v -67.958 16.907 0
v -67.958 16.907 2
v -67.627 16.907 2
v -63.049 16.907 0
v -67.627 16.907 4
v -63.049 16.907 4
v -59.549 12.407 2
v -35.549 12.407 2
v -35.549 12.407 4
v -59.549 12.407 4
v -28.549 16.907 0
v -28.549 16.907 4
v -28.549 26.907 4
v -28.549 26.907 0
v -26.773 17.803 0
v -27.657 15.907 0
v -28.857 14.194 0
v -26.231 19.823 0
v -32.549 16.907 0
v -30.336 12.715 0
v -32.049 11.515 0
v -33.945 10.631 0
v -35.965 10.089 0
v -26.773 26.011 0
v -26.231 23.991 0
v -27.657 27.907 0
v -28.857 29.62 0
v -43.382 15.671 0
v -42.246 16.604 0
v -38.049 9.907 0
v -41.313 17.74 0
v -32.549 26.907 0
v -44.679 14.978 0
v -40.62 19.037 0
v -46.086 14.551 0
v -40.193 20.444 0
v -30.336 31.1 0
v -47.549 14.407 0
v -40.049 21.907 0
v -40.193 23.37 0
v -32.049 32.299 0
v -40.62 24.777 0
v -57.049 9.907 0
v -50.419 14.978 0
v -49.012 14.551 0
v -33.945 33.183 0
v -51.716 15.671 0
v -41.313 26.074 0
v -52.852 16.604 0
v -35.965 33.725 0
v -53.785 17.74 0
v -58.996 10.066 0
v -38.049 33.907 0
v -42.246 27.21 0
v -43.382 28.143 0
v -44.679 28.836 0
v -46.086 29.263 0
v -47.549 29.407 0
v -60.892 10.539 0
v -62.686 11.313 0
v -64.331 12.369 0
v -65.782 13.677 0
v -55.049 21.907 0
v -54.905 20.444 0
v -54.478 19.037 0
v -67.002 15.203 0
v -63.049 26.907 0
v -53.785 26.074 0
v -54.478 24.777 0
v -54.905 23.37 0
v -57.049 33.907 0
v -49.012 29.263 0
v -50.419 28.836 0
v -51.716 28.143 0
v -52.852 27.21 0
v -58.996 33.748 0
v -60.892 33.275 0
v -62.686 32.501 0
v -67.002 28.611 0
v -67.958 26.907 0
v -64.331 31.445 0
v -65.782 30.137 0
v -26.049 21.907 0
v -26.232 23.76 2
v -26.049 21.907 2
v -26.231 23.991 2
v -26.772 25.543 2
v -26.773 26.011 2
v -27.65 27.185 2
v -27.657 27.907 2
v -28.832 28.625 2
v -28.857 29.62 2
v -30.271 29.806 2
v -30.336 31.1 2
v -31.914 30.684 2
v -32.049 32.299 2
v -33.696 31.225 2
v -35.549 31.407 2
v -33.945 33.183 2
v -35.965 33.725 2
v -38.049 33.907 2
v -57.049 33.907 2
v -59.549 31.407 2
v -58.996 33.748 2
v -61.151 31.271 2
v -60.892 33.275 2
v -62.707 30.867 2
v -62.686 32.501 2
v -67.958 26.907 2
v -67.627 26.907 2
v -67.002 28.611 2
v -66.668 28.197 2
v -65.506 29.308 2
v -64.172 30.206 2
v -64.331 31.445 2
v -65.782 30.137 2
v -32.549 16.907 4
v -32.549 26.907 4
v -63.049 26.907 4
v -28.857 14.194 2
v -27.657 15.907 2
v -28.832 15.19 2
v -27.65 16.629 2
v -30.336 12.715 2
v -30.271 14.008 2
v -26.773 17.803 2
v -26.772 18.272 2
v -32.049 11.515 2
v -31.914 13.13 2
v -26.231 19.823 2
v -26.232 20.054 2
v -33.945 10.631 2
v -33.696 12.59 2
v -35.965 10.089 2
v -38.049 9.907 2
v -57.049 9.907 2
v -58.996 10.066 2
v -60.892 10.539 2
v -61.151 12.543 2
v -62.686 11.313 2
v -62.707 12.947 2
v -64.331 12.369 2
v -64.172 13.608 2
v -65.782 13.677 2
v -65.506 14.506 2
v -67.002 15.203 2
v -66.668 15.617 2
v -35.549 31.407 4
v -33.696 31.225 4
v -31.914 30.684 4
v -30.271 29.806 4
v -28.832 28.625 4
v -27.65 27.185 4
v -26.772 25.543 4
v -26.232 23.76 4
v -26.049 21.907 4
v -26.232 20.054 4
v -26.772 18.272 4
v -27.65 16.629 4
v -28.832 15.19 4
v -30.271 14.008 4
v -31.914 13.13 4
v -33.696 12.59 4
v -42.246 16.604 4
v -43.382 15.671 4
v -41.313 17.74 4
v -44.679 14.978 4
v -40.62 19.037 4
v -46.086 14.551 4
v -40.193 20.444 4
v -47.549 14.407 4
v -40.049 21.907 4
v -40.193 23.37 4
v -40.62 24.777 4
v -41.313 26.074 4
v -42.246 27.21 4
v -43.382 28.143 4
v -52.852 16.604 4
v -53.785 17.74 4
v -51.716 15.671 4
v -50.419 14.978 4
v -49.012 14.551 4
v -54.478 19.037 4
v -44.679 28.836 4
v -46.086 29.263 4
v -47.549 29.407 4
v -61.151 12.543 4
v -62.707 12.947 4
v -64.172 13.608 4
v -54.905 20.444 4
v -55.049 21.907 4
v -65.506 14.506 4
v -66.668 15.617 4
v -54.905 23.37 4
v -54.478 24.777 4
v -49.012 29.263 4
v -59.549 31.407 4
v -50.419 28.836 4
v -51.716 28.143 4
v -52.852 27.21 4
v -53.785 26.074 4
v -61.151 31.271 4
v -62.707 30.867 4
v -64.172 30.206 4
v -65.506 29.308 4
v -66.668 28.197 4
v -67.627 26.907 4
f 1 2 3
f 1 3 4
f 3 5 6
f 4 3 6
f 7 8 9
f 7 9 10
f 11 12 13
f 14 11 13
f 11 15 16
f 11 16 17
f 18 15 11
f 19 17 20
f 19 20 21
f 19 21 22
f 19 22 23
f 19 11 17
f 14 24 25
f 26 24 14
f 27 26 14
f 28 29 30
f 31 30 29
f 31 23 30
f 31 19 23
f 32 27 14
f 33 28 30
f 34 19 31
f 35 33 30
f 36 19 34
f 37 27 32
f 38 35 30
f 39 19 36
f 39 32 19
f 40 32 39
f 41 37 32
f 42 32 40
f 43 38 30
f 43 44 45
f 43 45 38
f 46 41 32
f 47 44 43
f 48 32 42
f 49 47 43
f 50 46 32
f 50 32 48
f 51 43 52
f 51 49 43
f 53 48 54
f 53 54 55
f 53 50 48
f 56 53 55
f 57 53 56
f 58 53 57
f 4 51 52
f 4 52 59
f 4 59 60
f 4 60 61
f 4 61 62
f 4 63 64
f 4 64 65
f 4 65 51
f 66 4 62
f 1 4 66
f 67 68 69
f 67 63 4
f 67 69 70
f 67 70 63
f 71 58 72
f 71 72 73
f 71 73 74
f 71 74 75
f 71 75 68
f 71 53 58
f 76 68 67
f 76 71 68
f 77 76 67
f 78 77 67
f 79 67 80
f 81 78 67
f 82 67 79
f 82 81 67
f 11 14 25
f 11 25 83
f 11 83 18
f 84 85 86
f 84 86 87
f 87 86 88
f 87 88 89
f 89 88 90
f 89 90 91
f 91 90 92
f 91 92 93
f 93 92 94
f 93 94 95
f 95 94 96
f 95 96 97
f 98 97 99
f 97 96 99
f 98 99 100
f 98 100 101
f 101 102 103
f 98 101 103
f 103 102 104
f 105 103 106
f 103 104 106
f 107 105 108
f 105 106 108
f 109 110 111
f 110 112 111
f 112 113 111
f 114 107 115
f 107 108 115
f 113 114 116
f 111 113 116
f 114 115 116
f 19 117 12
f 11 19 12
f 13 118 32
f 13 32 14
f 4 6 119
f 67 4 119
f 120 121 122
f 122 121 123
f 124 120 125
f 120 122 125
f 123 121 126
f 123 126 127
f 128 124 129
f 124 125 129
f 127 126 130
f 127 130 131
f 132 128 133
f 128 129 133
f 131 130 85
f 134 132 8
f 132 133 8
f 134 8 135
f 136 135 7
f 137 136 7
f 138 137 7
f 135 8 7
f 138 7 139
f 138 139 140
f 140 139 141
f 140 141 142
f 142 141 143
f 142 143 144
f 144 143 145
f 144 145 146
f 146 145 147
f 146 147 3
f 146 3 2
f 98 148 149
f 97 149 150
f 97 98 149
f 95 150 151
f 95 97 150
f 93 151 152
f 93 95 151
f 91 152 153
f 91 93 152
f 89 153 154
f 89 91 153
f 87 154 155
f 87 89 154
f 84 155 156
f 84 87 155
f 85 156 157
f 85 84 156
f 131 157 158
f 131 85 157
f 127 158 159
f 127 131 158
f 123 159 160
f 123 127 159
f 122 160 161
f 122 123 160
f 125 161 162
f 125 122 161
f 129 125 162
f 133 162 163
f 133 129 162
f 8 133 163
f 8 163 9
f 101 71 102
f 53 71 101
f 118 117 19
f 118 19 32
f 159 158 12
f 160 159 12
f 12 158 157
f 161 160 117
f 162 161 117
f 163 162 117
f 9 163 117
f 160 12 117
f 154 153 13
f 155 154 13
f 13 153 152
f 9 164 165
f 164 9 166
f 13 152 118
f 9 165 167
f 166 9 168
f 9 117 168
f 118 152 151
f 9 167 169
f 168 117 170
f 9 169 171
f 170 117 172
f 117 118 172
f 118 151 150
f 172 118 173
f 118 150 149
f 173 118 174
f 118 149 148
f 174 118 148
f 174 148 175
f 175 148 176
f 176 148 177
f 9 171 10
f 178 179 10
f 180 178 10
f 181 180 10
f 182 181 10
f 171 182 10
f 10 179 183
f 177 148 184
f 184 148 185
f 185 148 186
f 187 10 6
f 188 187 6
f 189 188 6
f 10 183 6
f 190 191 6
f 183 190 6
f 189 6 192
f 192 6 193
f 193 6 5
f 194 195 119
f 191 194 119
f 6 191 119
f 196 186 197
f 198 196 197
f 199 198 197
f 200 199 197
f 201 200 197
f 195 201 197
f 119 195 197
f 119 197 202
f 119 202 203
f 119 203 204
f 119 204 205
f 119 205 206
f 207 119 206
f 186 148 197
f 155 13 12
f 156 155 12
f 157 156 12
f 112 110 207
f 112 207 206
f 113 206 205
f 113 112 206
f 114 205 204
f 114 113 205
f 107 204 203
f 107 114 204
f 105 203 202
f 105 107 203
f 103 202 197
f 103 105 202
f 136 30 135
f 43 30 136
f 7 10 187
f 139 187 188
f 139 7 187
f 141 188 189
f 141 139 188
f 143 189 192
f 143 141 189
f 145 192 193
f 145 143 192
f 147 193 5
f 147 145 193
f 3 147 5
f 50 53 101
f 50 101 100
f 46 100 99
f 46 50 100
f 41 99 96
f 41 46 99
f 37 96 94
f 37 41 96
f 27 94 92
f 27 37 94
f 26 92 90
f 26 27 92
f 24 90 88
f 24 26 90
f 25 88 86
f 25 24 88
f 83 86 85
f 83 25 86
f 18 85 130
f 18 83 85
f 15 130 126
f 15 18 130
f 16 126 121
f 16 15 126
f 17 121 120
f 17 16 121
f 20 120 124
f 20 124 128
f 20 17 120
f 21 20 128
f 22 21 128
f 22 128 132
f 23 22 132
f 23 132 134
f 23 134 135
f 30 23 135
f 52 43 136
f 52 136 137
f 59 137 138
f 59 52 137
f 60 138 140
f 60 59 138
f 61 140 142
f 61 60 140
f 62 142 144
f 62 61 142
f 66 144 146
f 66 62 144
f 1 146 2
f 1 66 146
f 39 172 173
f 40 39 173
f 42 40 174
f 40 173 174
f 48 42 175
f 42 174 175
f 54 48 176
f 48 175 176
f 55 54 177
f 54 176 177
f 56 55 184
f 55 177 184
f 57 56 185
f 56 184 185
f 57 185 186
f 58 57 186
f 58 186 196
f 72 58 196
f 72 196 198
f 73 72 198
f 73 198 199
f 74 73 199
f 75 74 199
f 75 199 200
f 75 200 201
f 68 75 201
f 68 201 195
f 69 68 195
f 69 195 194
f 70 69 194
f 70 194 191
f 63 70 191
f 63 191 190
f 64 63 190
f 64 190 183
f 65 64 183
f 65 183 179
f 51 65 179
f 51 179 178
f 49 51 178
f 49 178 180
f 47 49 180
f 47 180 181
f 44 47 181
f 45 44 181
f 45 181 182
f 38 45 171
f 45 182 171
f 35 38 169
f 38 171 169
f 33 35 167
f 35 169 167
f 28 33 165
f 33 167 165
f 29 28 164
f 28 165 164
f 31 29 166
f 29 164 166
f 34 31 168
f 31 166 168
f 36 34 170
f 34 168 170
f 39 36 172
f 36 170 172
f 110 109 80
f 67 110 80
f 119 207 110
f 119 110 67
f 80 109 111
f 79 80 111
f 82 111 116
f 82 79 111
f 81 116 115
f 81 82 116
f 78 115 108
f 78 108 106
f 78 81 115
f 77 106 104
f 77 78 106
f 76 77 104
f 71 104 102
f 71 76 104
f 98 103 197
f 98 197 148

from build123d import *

# Parameters (mm, degrees)
EXTRUSION1_DEPTH        = 2
EXTRUSION4_DEPTH        = 2
ESQUISSE3_R             = 7.5
ESQUISSE3_W             = 4
ESQUISSE3_H             = 10
ESQUISSE3_W_2           = 6
ENL_V_MAT_EXTRU_1_DEPTH = 5


with BuildPart() as part:
    # Esquisse1 → Extrusion1 (new body)
    with BuildSketch(Plane.XY):
        with BuildLine():
            Line((-57.049073, 33.907042), (-38.049073, 33.907042))
            ThreePointArc((-38.049073, 33.907042), (-26.049073, 21.907042), (-38.049073, 9.907042))
            Line((-38.049073, 9.907042), (-57.049073, 9.907042))
            ThreePointArc((-57.049073, 9.907042), (-69.049073, 21.907042), (-57.049073, 33.907042))
        make_face()
    extrude(amount=EXTRUSION1_DEPTH)

    # Esquisse2 → Extrusion4 (add)
    with BuildSketch(Plane.XY.offset(2)):
        with BuildLine():
            Line((-59.549073, 31.407042), (-35.549073, 31.407042))
            ThreePointArc((-35.549073, 31.407042), (-26.049073, 21.907042), (-35.549073, 12.407042))
            Line((-35.549073, 12.407042), (-59.549073, 12.407042))
            ThreePointArc((-59.549073, 12.407042), (-69.049073, 21.907042), (-59.549073, 31.407042))
        make_face()
    extrude(amount=EXTRUSION4_DEPTH)

    # Esquisse3 → Enlèv. mat.-Extru.1 (cut, through all)
    with BuildSketch(Plane.XY.offset(4)):
        with Locations((-47.549073, 21.907042)):
            Circle(ESQUISSE3_R)
        with Locations((-30.549073, 21.907042)):
            Rectangle(ESQUISSE3_W, ESQUISSE3_H)
        with Locations((-66.049073, 21.907042)):
            Rectangle(ESQUISSE3_W_2, ESQUISSE3_H)
    extrude(amount=-ENL_V_MAT_EXTRU_1_DEPTH, mode=Mode.SUBTRACT)


solid = part.part
